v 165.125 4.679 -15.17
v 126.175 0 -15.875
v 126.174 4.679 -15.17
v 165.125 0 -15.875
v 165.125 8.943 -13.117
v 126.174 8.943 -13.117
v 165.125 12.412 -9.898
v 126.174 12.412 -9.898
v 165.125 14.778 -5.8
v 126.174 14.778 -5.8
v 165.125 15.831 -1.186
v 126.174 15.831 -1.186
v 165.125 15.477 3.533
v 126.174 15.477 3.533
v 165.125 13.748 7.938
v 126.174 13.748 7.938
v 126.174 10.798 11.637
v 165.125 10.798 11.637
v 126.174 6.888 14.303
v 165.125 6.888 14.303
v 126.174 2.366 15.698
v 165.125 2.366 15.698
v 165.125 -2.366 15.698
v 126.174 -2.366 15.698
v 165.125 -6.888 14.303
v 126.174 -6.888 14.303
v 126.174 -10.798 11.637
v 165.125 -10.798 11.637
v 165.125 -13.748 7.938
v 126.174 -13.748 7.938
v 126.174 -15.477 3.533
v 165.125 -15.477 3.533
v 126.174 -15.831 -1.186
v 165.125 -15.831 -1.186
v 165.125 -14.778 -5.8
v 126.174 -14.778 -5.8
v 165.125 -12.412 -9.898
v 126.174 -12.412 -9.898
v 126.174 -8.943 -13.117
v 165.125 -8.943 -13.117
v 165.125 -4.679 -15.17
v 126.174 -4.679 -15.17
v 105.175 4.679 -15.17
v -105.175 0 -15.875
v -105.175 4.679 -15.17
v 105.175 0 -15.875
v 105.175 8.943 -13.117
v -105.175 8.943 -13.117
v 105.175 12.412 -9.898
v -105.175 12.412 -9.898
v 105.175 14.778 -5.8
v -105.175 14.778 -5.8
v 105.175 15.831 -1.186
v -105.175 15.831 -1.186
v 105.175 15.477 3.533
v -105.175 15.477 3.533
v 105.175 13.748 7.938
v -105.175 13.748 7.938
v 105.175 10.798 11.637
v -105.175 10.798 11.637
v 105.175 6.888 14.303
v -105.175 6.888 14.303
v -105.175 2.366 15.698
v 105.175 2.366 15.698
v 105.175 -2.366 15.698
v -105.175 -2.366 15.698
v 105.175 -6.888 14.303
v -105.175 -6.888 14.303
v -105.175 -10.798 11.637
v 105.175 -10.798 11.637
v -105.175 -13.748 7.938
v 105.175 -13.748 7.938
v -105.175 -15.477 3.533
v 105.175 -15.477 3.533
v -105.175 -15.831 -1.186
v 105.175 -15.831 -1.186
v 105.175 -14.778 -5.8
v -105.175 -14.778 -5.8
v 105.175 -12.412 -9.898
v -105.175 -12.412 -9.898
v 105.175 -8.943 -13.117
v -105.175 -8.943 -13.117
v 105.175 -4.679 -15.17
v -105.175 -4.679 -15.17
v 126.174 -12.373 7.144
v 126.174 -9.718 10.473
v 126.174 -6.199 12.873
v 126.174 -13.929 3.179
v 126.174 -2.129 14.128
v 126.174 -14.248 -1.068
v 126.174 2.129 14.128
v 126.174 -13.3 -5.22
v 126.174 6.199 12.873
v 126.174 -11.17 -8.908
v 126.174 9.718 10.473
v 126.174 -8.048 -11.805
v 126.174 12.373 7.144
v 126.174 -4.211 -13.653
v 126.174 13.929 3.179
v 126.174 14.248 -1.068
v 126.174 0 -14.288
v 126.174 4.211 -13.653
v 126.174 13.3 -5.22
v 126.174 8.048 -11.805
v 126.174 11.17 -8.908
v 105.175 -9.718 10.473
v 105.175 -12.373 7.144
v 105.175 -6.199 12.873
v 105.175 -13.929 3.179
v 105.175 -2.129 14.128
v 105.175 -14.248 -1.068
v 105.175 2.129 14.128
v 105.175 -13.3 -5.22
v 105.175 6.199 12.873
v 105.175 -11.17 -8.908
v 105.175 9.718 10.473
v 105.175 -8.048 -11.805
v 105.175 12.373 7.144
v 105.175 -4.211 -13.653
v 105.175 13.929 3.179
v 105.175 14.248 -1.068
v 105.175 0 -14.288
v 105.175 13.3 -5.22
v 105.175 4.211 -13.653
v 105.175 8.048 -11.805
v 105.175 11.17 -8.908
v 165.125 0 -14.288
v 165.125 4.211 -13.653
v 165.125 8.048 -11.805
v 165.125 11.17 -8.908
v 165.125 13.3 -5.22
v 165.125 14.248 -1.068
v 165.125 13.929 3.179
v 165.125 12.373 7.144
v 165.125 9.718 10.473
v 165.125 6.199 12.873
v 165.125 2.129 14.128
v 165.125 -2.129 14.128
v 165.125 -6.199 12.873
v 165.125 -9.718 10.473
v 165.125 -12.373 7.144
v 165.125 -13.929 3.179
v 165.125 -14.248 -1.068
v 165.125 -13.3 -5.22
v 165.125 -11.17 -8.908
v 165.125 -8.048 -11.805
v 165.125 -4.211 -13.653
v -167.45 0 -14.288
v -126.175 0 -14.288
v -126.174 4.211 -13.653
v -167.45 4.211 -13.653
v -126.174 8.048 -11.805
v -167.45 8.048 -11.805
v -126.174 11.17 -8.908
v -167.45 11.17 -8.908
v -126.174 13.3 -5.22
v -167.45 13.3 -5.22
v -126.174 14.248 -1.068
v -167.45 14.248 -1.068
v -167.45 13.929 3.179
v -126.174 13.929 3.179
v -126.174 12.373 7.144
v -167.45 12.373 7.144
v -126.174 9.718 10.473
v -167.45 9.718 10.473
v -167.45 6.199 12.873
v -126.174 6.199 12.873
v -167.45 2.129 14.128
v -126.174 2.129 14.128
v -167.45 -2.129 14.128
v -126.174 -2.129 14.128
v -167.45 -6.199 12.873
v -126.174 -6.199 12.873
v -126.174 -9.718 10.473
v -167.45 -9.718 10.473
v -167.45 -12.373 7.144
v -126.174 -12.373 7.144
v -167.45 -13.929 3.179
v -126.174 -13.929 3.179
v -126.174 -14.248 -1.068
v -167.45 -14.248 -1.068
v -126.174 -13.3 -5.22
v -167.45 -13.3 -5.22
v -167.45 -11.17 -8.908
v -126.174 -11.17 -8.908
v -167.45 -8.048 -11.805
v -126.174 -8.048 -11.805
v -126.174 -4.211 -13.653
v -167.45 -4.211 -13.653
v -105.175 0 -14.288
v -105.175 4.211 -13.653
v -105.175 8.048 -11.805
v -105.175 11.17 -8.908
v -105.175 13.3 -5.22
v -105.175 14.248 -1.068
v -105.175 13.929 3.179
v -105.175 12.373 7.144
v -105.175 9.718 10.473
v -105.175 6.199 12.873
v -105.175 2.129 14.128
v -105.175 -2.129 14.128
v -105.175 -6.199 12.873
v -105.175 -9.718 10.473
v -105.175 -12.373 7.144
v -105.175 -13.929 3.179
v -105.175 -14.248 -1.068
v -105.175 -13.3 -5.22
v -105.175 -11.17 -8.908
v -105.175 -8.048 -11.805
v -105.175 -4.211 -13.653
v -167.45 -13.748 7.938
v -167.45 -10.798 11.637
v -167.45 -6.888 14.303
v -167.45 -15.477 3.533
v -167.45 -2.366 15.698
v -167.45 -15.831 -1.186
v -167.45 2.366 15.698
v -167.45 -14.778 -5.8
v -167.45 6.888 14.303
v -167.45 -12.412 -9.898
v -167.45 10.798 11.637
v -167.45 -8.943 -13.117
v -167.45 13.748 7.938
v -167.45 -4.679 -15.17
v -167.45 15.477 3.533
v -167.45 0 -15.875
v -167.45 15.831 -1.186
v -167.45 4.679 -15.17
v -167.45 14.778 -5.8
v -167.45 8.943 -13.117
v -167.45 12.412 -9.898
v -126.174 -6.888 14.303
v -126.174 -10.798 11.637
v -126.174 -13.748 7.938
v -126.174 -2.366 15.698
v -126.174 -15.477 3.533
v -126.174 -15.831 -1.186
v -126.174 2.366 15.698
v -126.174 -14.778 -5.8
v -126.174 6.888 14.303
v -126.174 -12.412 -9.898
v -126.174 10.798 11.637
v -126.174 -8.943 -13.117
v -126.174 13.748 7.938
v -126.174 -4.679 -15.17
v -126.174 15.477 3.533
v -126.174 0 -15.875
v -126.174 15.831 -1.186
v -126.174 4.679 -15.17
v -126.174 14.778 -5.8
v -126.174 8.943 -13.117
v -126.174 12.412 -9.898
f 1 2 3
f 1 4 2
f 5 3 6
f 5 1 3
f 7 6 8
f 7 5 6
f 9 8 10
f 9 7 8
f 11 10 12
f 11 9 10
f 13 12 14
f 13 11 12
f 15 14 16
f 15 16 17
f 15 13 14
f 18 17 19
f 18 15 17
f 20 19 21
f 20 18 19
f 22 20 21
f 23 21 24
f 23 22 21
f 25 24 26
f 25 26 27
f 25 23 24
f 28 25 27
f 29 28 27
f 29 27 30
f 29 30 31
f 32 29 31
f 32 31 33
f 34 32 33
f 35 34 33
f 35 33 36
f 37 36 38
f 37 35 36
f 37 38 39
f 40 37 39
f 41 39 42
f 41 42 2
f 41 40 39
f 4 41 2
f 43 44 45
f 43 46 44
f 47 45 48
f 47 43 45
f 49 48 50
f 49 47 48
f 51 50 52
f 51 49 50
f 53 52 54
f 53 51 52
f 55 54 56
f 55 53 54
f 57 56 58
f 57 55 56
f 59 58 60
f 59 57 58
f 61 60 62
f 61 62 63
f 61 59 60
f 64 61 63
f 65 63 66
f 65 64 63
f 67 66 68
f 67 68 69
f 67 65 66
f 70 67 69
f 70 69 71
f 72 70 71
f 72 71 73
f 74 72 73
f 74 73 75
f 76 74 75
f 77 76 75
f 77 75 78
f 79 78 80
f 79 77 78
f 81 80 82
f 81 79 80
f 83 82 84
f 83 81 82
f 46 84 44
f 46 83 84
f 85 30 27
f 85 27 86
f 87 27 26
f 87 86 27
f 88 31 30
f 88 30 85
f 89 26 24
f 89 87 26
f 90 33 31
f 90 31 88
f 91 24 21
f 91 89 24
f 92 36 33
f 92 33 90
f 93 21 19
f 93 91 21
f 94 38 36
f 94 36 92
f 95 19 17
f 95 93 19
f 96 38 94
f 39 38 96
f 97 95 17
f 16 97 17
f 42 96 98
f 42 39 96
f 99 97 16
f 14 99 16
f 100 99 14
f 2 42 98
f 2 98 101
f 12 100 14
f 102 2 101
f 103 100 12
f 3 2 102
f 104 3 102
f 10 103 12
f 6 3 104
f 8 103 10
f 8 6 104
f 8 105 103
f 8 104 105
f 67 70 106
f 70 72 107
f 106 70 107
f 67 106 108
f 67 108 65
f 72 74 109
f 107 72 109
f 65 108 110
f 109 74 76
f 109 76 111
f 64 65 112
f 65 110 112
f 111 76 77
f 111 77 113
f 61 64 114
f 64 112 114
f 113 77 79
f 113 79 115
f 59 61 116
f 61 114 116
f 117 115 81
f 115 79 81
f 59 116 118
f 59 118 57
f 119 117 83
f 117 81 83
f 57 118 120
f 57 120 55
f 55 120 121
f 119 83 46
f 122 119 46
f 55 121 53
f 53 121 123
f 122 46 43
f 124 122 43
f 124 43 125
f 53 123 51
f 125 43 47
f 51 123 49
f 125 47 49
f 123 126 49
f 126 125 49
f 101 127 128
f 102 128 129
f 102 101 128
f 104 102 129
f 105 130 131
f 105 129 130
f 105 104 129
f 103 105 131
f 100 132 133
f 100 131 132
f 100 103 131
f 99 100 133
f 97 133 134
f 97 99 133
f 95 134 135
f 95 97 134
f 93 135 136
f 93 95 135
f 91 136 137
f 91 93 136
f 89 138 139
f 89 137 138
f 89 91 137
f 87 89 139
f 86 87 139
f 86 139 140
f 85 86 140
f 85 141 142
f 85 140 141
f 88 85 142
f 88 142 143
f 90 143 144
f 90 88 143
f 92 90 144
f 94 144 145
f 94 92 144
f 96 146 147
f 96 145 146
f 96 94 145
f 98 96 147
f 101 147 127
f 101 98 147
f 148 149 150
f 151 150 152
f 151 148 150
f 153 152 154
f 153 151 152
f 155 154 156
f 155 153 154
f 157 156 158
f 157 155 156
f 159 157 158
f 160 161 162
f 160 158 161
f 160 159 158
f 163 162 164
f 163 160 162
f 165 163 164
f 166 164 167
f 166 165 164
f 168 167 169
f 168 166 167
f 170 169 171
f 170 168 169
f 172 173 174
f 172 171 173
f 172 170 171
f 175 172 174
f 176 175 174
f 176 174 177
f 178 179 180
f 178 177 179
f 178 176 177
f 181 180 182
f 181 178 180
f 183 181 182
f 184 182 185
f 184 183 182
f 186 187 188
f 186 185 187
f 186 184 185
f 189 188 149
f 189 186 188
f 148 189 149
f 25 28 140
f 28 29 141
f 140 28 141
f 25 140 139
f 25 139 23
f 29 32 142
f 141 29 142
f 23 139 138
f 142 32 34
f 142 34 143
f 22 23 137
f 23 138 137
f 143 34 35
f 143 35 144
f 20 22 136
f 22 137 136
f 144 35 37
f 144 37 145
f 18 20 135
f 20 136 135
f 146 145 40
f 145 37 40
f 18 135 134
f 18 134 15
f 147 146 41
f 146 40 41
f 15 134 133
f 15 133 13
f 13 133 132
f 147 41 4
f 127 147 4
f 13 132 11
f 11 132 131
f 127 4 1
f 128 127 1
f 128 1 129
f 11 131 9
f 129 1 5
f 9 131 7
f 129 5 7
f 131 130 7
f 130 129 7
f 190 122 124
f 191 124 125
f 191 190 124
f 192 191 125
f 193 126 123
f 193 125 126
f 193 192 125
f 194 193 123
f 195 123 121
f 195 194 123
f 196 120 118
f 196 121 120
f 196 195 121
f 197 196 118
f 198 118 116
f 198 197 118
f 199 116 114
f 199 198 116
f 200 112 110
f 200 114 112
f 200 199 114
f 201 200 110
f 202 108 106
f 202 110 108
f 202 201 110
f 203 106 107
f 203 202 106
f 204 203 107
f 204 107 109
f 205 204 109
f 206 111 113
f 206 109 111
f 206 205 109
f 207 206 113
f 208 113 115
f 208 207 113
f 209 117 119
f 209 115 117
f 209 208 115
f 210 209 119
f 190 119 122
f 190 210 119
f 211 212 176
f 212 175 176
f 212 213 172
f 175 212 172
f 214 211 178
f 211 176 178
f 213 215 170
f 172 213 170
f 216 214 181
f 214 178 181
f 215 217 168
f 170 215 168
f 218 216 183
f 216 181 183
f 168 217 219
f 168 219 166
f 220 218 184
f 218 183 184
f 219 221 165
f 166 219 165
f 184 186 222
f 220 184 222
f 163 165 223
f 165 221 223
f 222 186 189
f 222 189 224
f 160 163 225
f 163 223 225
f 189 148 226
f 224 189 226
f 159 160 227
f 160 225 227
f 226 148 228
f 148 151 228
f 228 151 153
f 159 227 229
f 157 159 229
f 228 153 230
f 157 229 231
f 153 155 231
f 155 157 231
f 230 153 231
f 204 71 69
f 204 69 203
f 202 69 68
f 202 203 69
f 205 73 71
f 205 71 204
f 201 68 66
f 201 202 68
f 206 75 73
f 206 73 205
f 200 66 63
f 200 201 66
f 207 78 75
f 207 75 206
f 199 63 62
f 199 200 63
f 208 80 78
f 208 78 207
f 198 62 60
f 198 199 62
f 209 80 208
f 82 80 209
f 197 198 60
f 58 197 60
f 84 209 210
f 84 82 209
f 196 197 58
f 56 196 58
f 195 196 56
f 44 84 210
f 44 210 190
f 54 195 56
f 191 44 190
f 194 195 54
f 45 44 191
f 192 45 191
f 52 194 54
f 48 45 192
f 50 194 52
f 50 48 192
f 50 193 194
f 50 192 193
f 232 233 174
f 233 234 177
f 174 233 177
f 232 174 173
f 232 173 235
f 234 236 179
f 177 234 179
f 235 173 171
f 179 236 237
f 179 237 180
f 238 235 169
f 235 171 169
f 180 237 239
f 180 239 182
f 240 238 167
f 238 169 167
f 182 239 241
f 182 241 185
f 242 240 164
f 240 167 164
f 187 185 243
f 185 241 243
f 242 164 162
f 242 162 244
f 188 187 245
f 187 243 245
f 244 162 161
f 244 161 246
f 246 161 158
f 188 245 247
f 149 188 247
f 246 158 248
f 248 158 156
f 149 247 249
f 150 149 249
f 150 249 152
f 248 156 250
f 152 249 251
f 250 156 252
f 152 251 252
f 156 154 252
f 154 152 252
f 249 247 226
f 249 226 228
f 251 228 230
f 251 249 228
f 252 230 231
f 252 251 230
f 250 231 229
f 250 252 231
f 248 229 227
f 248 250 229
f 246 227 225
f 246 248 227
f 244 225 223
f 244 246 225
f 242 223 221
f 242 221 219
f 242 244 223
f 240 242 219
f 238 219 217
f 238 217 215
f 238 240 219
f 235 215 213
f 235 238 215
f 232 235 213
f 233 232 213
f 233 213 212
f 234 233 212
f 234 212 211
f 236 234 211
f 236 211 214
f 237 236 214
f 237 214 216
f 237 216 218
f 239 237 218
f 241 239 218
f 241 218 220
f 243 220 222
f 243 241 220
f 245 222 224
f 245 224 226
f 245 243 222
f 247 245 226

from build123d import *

# Parameters (mm, degrees)
SKETCH1_R               = 15.875
SKETCH1_R_2             = 14.2875
EXTRUDE_THIN1_DEPTH     = 167.4495
CUT_EXTRUDE1_DEPTH      = 169.947821236
CUT_EXTRUDE1_DEPTH_BACK = 169.947821236
SKETCH2_W               = 20.99999991
SKETCH2_H               = 31.75
SKETCH2_W_2             = 2.3241


with BuildPart() as part:
    # Sketch1 → Extrude-Thin1 (new, symmetric)
    with BuildSketch(Plane(origin=(0, 0, 0), x_dir=(0, 0, -1), z_dir=(1, 0, 0))):
        Circle(SKETCH1_R)
        Circle(SKETCH1_R_2, mode=Mode.SUBTRACT)
    extrude(amount=EXTRUDE_THIN1_DEPTH, both=True)

    # Sketch2 → Cut-Extrude1 (cut, two sides: drawn at the far end of the back side and taken through both)
    with BuildSketch(Plane.XY.offset(-CUT_EXTRUDE1_DEPTH_BACK)):
        with Locations((115.674500045, 0)):
            Rectangle(SKETCH2_W, SKETCH2_H)
        with Locations((-115.674500045, 0)):
            Rectangle(SKETCH2_W, SKETCH2_H)
        with Locations((166.28745, 0)):
            Rectangle(SKETCH2_W_2, SKETCH2_H)
    extrude(amount=CUT_EXTRUDE1_DEPTH + CUT_EXTRUDE1_DEPTH_BACK, mode=Mode.SUBTRACT)


with BuildPart() as cut_extrude1_piece_1:
    # of the separate pieces the step leaves, piece 1, a body of its own (cut_extrude1_pieces)
    add(part.part.solids().sort_by_distance((-105.17450009, 0, -15.875))[0])


with BuildPart() as cut_extrude1_piece_2:
    # of the separate pieces the step leaves, piece 2, a body of its own (cut_extrude1_pieces)
    add(part.part.solids().sort_by_distance((-167.4495, 0, -15.875))[0])


with BuildPart() as cut_extrude1_piece_3:
    # of the separate pieces the step leaves, piece 3, a body of its own (cut_extrude1_pieces)
    add(part.part.solids().sort_by_distance((126.1745, 0, -15.875))[0])


solid = Compound([cut_extrude1_piece_1.part, cut_extrude1_piece_2.part, cut_extrude1_piece_3.part])
